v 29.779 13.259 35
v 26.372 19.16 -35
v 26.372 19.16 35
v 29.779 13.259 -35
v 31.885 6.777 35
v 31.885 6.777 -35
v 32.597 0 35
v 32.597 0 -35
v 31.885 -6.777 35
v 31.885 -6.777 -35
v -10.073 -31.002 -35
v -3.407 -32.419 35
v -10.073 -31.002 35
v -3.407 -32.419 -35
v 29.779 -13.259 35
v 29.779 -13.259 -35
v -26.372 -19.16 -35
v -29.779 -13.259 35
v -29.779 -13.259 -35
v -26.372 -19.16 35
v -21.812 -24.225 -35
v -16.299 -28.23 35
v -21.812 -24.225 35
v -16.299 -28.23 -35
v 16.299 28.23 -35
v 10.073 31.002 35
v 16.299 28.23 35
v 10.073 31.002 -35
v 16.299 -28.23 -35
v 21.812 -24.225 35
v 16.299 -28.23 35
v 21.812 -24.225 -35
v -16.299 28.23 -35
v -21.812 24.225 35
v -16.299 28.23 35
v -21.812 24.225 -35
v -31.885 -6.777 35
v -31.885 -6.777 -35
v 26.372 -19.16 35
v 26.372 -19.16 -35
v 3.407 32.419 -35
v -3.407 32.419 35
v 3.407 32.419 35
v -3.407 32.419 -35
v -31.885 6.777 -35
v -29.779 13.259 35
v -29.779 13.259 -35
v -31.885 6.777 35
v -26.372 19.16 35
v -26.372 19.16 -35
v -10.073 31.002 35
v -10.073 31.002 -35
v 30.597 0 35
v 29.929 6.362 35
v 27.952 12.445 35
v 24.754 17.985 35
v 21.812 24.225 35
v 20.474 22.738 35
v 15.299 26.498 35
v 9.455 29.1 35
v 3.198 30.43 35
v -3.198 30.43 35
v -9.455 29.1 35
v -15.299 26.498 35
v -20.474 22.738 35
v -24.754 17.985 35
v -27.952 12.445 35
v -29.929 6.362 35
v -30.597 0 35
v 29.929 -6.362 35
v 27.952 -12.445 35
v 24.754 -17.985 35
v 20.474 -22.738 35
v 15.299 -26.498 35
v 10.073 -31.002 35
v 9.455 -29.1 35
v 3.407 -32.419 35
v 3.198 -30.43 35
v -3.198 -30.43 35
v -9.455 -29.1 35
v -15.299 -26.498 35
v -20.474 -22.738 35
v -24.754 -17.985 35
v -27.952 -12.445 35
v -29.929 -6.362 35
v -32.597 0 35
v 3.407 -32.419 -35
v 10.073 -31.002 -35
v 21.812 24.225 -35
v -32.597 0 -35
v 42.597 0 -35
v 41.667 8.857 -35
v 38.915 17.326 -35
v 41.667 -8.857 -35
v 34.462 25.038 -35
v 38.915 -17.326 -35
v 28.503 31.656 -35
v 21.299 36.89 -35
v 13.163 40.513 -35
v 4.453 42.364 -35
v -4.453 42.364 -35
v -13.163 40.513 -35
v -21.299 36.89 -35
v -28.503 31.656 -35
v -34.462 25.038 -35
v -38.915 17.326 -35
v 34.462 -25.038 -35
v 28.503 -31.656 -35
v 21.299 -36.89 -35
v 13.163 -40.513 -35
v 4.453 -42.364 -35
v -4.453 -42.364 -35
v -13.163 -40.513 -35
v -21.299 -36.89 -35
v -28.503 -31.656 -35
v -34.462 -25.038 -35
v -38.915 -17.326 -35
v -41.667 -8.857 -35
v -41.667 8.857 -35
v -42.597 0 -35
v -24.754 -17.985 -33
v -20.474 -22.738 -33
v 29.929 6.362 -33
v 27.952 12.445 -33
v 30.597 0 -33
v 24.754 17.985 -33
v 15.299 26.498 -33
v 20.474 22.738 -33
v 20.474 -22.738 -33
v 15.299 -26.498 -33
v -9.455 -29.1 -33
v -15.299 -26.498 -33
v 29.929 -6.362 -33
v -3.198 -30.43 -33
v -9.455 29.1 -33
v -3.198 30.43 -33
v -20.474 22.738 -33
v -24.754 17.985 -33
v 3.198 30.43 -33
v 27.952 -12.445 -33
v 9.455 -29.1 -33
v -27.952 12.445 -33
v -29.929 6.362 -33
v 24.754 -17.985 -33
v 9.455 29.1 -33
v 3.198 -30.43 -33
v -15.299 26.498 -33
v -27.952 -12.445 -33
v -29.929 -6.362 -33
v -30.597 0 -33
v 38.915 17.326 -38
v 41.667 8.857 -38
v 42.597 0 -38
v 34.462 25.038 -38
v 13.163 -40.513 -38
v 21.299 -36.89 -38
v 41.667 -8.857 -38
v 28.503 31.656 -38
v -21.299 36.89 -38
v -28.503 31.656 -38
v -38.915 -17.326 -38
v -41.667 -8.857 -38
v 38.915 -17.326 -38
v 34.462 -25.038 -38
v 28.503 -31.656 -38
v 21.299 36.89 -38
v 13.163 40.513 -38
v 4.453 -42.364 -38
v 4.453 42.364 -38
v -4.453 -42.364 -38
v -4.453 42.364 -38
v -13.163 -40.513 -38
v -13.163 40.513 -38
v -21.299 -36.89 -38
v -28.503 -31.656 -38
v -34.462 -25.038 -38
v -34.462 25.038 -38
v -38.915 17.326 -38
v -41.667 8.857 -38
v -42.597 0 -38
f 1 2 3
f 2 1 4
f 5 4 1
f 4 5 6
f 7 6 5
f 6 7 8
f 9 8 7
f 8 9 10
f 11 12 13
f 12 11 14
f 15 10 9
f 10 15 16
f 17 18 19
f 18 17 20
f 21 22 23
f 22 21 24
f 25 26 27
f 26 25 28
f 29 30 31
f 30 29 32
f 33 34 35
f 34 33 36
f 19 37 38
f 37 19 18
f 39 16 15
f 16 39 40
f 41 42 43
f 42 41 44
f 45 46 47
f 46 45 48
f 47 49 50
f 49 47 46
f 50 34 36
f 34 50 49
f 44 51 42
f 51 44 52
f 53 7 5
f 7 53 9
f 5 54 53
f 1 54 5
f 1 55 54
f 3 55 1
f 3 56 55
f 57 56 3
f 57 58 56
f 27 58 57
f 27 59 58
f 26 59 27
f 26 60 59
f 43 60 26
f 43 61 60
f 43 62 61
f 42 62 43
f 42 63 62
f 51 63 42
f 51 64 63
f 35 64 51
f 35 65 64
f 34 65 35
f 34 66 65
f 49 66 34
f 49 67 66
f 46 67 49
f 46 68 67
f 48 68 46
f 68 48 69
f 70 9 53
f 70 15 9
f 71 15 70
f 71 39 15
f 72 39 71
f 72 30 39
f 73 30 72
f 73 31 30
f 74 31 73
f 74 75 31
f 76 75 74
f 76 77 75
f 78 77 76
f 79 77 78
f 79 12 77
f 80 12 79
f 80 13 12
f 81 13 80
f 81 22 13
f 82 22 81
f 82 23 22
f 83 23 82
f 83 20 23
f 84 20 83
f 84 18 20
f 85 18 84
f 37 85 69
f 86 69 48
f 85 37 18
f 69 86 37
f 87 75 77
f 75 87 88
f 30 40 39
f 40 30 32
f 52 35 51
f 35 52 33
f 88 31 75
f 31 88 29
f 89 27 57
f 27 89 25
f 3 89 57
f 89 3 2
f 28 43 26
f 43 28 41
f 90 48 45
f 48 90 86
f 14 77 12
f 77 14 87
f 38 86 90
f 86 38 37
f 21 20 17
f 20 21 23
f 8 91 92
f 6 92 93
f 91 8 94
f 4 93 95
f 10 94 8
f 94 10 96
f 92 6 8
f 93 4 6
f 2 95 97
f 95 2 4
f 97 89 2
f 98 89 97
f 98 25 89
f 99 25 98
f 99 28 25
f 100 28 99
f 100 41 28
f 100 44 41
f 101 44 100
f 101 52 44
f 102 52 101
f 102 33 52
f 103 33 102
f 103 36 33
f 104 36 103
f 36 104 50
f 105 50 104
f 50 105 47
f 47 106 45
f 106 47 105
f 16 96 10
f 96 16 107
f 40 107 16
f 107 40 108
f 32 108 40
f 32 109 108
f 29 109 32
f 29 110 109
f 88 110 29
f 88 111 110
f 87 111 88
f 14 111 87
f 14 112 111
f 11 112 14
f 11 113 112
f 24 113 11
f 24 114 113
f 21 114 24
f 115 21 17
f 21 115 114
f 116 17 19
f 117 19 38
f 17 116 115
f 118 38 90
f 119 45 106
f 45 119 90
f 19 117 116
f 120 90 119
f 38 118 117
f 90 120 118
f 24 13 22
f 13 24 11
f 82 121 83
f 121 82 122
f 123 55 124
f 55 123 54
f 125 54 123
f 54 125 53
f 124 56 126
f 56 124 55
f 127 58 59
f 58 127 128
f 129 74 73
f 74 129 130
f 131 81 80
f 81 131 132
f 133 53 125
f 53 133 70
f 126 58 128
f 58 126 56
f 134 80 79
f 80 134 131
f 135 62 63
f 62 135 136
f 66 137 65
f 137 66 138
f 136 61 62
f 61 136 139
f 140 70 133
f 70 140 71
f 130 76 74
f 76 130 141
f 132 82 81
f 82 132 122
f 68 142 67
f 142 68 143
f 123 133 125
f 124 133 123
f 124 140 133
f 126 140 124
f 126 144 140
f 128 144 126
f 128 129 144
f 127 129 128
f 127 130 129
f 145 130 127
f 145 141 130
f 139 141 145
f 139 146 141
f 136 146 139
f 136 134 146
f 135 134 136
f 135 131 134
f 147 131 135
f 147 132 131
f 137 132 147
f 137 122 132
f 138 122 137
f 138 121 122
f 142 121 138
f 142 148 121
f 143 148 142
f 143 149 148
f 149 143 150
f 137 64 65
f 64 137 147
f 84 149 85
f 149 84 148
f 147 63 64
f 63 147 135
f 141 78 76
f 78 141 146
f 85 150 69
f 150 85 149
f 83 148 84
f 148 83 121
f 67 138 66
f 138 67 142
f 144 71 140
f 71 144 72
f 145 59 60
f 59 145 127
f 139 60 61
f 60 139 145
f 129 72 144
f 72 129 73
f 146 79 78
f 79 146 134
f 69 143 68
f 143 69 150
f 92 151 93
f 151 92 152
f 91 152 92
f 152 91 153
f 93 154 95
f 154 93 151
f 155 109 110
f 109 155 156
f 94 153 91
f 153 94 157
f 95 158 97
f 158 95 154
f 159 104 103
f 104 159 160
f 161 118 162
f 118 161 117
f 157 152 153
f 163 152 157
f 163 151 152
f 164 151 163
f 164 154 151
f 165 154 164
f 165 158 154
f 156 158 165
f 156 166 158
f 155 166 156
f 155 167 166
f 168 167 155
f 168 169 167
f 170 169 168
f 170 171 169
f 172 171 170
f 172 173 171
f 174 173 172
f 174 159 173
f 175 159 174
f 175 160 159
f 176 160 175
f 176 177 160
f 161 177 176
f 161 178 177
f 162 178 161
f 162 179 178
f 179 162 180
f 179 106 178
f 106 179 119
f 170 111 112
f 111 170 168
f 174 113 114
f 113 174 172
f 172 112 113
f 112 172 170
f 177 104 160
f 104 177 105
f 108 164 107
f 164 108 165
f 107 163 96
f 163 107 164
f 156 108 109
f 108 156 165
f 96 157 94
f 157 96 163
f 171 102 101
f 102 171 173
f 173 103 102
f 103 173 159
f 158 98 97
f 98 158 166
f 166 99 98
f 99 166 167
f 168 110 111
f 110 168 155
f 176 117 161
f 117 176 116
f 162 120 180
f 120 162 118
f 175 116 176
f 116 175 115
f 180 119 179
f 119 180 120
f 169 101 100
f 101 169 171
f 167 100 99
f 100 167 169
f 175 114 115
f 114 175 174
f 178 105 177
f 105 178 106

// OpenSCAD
module coaster(dia){
 h = 3;
 cylinder(h = h, d = dia, center = true);
}

module cup_dia_h(dia, h){
 inner_dia = dia - 4;
 inner_h = h - 2;
 difference() {
  cylinder(h = h, d = dia, center = true);
  translate([0, 0, (h - inner_h) / 2])
   cylinder(h = inner_h, d = inner_dia, center = true);
  }
}

module cup_h_vol(h, vol){
 inner_h = h - 2;
 inner_dia = sqrt(vol / PI / inner_h) * 2;
 dia = inner_dia + 4;
 difference(){
  cylinder(h = h, d = dia, center = true);
  translate([0, 0, (h - inner_h) / 2])
   cylinder(h = inner_h, d = inner_dia, center = true);
  }
}

module cup_on_coaster(h, vol) {
 coaster_h = 3;
 inner_h   = h - 2;
 inner_dia = sqrt(vol / PI / inner_h) * 2;
 cup_dia   = inner_dia + 4;
 coaster_dia = cup_dia + 20;
 cup_h_vol(h, vol);
 translate([0, 0, (-h / 2) - (coaster_h / 2)])
  coaster(coaster_dia);
}

cup_on_coaster(h=70, vol=200000);
